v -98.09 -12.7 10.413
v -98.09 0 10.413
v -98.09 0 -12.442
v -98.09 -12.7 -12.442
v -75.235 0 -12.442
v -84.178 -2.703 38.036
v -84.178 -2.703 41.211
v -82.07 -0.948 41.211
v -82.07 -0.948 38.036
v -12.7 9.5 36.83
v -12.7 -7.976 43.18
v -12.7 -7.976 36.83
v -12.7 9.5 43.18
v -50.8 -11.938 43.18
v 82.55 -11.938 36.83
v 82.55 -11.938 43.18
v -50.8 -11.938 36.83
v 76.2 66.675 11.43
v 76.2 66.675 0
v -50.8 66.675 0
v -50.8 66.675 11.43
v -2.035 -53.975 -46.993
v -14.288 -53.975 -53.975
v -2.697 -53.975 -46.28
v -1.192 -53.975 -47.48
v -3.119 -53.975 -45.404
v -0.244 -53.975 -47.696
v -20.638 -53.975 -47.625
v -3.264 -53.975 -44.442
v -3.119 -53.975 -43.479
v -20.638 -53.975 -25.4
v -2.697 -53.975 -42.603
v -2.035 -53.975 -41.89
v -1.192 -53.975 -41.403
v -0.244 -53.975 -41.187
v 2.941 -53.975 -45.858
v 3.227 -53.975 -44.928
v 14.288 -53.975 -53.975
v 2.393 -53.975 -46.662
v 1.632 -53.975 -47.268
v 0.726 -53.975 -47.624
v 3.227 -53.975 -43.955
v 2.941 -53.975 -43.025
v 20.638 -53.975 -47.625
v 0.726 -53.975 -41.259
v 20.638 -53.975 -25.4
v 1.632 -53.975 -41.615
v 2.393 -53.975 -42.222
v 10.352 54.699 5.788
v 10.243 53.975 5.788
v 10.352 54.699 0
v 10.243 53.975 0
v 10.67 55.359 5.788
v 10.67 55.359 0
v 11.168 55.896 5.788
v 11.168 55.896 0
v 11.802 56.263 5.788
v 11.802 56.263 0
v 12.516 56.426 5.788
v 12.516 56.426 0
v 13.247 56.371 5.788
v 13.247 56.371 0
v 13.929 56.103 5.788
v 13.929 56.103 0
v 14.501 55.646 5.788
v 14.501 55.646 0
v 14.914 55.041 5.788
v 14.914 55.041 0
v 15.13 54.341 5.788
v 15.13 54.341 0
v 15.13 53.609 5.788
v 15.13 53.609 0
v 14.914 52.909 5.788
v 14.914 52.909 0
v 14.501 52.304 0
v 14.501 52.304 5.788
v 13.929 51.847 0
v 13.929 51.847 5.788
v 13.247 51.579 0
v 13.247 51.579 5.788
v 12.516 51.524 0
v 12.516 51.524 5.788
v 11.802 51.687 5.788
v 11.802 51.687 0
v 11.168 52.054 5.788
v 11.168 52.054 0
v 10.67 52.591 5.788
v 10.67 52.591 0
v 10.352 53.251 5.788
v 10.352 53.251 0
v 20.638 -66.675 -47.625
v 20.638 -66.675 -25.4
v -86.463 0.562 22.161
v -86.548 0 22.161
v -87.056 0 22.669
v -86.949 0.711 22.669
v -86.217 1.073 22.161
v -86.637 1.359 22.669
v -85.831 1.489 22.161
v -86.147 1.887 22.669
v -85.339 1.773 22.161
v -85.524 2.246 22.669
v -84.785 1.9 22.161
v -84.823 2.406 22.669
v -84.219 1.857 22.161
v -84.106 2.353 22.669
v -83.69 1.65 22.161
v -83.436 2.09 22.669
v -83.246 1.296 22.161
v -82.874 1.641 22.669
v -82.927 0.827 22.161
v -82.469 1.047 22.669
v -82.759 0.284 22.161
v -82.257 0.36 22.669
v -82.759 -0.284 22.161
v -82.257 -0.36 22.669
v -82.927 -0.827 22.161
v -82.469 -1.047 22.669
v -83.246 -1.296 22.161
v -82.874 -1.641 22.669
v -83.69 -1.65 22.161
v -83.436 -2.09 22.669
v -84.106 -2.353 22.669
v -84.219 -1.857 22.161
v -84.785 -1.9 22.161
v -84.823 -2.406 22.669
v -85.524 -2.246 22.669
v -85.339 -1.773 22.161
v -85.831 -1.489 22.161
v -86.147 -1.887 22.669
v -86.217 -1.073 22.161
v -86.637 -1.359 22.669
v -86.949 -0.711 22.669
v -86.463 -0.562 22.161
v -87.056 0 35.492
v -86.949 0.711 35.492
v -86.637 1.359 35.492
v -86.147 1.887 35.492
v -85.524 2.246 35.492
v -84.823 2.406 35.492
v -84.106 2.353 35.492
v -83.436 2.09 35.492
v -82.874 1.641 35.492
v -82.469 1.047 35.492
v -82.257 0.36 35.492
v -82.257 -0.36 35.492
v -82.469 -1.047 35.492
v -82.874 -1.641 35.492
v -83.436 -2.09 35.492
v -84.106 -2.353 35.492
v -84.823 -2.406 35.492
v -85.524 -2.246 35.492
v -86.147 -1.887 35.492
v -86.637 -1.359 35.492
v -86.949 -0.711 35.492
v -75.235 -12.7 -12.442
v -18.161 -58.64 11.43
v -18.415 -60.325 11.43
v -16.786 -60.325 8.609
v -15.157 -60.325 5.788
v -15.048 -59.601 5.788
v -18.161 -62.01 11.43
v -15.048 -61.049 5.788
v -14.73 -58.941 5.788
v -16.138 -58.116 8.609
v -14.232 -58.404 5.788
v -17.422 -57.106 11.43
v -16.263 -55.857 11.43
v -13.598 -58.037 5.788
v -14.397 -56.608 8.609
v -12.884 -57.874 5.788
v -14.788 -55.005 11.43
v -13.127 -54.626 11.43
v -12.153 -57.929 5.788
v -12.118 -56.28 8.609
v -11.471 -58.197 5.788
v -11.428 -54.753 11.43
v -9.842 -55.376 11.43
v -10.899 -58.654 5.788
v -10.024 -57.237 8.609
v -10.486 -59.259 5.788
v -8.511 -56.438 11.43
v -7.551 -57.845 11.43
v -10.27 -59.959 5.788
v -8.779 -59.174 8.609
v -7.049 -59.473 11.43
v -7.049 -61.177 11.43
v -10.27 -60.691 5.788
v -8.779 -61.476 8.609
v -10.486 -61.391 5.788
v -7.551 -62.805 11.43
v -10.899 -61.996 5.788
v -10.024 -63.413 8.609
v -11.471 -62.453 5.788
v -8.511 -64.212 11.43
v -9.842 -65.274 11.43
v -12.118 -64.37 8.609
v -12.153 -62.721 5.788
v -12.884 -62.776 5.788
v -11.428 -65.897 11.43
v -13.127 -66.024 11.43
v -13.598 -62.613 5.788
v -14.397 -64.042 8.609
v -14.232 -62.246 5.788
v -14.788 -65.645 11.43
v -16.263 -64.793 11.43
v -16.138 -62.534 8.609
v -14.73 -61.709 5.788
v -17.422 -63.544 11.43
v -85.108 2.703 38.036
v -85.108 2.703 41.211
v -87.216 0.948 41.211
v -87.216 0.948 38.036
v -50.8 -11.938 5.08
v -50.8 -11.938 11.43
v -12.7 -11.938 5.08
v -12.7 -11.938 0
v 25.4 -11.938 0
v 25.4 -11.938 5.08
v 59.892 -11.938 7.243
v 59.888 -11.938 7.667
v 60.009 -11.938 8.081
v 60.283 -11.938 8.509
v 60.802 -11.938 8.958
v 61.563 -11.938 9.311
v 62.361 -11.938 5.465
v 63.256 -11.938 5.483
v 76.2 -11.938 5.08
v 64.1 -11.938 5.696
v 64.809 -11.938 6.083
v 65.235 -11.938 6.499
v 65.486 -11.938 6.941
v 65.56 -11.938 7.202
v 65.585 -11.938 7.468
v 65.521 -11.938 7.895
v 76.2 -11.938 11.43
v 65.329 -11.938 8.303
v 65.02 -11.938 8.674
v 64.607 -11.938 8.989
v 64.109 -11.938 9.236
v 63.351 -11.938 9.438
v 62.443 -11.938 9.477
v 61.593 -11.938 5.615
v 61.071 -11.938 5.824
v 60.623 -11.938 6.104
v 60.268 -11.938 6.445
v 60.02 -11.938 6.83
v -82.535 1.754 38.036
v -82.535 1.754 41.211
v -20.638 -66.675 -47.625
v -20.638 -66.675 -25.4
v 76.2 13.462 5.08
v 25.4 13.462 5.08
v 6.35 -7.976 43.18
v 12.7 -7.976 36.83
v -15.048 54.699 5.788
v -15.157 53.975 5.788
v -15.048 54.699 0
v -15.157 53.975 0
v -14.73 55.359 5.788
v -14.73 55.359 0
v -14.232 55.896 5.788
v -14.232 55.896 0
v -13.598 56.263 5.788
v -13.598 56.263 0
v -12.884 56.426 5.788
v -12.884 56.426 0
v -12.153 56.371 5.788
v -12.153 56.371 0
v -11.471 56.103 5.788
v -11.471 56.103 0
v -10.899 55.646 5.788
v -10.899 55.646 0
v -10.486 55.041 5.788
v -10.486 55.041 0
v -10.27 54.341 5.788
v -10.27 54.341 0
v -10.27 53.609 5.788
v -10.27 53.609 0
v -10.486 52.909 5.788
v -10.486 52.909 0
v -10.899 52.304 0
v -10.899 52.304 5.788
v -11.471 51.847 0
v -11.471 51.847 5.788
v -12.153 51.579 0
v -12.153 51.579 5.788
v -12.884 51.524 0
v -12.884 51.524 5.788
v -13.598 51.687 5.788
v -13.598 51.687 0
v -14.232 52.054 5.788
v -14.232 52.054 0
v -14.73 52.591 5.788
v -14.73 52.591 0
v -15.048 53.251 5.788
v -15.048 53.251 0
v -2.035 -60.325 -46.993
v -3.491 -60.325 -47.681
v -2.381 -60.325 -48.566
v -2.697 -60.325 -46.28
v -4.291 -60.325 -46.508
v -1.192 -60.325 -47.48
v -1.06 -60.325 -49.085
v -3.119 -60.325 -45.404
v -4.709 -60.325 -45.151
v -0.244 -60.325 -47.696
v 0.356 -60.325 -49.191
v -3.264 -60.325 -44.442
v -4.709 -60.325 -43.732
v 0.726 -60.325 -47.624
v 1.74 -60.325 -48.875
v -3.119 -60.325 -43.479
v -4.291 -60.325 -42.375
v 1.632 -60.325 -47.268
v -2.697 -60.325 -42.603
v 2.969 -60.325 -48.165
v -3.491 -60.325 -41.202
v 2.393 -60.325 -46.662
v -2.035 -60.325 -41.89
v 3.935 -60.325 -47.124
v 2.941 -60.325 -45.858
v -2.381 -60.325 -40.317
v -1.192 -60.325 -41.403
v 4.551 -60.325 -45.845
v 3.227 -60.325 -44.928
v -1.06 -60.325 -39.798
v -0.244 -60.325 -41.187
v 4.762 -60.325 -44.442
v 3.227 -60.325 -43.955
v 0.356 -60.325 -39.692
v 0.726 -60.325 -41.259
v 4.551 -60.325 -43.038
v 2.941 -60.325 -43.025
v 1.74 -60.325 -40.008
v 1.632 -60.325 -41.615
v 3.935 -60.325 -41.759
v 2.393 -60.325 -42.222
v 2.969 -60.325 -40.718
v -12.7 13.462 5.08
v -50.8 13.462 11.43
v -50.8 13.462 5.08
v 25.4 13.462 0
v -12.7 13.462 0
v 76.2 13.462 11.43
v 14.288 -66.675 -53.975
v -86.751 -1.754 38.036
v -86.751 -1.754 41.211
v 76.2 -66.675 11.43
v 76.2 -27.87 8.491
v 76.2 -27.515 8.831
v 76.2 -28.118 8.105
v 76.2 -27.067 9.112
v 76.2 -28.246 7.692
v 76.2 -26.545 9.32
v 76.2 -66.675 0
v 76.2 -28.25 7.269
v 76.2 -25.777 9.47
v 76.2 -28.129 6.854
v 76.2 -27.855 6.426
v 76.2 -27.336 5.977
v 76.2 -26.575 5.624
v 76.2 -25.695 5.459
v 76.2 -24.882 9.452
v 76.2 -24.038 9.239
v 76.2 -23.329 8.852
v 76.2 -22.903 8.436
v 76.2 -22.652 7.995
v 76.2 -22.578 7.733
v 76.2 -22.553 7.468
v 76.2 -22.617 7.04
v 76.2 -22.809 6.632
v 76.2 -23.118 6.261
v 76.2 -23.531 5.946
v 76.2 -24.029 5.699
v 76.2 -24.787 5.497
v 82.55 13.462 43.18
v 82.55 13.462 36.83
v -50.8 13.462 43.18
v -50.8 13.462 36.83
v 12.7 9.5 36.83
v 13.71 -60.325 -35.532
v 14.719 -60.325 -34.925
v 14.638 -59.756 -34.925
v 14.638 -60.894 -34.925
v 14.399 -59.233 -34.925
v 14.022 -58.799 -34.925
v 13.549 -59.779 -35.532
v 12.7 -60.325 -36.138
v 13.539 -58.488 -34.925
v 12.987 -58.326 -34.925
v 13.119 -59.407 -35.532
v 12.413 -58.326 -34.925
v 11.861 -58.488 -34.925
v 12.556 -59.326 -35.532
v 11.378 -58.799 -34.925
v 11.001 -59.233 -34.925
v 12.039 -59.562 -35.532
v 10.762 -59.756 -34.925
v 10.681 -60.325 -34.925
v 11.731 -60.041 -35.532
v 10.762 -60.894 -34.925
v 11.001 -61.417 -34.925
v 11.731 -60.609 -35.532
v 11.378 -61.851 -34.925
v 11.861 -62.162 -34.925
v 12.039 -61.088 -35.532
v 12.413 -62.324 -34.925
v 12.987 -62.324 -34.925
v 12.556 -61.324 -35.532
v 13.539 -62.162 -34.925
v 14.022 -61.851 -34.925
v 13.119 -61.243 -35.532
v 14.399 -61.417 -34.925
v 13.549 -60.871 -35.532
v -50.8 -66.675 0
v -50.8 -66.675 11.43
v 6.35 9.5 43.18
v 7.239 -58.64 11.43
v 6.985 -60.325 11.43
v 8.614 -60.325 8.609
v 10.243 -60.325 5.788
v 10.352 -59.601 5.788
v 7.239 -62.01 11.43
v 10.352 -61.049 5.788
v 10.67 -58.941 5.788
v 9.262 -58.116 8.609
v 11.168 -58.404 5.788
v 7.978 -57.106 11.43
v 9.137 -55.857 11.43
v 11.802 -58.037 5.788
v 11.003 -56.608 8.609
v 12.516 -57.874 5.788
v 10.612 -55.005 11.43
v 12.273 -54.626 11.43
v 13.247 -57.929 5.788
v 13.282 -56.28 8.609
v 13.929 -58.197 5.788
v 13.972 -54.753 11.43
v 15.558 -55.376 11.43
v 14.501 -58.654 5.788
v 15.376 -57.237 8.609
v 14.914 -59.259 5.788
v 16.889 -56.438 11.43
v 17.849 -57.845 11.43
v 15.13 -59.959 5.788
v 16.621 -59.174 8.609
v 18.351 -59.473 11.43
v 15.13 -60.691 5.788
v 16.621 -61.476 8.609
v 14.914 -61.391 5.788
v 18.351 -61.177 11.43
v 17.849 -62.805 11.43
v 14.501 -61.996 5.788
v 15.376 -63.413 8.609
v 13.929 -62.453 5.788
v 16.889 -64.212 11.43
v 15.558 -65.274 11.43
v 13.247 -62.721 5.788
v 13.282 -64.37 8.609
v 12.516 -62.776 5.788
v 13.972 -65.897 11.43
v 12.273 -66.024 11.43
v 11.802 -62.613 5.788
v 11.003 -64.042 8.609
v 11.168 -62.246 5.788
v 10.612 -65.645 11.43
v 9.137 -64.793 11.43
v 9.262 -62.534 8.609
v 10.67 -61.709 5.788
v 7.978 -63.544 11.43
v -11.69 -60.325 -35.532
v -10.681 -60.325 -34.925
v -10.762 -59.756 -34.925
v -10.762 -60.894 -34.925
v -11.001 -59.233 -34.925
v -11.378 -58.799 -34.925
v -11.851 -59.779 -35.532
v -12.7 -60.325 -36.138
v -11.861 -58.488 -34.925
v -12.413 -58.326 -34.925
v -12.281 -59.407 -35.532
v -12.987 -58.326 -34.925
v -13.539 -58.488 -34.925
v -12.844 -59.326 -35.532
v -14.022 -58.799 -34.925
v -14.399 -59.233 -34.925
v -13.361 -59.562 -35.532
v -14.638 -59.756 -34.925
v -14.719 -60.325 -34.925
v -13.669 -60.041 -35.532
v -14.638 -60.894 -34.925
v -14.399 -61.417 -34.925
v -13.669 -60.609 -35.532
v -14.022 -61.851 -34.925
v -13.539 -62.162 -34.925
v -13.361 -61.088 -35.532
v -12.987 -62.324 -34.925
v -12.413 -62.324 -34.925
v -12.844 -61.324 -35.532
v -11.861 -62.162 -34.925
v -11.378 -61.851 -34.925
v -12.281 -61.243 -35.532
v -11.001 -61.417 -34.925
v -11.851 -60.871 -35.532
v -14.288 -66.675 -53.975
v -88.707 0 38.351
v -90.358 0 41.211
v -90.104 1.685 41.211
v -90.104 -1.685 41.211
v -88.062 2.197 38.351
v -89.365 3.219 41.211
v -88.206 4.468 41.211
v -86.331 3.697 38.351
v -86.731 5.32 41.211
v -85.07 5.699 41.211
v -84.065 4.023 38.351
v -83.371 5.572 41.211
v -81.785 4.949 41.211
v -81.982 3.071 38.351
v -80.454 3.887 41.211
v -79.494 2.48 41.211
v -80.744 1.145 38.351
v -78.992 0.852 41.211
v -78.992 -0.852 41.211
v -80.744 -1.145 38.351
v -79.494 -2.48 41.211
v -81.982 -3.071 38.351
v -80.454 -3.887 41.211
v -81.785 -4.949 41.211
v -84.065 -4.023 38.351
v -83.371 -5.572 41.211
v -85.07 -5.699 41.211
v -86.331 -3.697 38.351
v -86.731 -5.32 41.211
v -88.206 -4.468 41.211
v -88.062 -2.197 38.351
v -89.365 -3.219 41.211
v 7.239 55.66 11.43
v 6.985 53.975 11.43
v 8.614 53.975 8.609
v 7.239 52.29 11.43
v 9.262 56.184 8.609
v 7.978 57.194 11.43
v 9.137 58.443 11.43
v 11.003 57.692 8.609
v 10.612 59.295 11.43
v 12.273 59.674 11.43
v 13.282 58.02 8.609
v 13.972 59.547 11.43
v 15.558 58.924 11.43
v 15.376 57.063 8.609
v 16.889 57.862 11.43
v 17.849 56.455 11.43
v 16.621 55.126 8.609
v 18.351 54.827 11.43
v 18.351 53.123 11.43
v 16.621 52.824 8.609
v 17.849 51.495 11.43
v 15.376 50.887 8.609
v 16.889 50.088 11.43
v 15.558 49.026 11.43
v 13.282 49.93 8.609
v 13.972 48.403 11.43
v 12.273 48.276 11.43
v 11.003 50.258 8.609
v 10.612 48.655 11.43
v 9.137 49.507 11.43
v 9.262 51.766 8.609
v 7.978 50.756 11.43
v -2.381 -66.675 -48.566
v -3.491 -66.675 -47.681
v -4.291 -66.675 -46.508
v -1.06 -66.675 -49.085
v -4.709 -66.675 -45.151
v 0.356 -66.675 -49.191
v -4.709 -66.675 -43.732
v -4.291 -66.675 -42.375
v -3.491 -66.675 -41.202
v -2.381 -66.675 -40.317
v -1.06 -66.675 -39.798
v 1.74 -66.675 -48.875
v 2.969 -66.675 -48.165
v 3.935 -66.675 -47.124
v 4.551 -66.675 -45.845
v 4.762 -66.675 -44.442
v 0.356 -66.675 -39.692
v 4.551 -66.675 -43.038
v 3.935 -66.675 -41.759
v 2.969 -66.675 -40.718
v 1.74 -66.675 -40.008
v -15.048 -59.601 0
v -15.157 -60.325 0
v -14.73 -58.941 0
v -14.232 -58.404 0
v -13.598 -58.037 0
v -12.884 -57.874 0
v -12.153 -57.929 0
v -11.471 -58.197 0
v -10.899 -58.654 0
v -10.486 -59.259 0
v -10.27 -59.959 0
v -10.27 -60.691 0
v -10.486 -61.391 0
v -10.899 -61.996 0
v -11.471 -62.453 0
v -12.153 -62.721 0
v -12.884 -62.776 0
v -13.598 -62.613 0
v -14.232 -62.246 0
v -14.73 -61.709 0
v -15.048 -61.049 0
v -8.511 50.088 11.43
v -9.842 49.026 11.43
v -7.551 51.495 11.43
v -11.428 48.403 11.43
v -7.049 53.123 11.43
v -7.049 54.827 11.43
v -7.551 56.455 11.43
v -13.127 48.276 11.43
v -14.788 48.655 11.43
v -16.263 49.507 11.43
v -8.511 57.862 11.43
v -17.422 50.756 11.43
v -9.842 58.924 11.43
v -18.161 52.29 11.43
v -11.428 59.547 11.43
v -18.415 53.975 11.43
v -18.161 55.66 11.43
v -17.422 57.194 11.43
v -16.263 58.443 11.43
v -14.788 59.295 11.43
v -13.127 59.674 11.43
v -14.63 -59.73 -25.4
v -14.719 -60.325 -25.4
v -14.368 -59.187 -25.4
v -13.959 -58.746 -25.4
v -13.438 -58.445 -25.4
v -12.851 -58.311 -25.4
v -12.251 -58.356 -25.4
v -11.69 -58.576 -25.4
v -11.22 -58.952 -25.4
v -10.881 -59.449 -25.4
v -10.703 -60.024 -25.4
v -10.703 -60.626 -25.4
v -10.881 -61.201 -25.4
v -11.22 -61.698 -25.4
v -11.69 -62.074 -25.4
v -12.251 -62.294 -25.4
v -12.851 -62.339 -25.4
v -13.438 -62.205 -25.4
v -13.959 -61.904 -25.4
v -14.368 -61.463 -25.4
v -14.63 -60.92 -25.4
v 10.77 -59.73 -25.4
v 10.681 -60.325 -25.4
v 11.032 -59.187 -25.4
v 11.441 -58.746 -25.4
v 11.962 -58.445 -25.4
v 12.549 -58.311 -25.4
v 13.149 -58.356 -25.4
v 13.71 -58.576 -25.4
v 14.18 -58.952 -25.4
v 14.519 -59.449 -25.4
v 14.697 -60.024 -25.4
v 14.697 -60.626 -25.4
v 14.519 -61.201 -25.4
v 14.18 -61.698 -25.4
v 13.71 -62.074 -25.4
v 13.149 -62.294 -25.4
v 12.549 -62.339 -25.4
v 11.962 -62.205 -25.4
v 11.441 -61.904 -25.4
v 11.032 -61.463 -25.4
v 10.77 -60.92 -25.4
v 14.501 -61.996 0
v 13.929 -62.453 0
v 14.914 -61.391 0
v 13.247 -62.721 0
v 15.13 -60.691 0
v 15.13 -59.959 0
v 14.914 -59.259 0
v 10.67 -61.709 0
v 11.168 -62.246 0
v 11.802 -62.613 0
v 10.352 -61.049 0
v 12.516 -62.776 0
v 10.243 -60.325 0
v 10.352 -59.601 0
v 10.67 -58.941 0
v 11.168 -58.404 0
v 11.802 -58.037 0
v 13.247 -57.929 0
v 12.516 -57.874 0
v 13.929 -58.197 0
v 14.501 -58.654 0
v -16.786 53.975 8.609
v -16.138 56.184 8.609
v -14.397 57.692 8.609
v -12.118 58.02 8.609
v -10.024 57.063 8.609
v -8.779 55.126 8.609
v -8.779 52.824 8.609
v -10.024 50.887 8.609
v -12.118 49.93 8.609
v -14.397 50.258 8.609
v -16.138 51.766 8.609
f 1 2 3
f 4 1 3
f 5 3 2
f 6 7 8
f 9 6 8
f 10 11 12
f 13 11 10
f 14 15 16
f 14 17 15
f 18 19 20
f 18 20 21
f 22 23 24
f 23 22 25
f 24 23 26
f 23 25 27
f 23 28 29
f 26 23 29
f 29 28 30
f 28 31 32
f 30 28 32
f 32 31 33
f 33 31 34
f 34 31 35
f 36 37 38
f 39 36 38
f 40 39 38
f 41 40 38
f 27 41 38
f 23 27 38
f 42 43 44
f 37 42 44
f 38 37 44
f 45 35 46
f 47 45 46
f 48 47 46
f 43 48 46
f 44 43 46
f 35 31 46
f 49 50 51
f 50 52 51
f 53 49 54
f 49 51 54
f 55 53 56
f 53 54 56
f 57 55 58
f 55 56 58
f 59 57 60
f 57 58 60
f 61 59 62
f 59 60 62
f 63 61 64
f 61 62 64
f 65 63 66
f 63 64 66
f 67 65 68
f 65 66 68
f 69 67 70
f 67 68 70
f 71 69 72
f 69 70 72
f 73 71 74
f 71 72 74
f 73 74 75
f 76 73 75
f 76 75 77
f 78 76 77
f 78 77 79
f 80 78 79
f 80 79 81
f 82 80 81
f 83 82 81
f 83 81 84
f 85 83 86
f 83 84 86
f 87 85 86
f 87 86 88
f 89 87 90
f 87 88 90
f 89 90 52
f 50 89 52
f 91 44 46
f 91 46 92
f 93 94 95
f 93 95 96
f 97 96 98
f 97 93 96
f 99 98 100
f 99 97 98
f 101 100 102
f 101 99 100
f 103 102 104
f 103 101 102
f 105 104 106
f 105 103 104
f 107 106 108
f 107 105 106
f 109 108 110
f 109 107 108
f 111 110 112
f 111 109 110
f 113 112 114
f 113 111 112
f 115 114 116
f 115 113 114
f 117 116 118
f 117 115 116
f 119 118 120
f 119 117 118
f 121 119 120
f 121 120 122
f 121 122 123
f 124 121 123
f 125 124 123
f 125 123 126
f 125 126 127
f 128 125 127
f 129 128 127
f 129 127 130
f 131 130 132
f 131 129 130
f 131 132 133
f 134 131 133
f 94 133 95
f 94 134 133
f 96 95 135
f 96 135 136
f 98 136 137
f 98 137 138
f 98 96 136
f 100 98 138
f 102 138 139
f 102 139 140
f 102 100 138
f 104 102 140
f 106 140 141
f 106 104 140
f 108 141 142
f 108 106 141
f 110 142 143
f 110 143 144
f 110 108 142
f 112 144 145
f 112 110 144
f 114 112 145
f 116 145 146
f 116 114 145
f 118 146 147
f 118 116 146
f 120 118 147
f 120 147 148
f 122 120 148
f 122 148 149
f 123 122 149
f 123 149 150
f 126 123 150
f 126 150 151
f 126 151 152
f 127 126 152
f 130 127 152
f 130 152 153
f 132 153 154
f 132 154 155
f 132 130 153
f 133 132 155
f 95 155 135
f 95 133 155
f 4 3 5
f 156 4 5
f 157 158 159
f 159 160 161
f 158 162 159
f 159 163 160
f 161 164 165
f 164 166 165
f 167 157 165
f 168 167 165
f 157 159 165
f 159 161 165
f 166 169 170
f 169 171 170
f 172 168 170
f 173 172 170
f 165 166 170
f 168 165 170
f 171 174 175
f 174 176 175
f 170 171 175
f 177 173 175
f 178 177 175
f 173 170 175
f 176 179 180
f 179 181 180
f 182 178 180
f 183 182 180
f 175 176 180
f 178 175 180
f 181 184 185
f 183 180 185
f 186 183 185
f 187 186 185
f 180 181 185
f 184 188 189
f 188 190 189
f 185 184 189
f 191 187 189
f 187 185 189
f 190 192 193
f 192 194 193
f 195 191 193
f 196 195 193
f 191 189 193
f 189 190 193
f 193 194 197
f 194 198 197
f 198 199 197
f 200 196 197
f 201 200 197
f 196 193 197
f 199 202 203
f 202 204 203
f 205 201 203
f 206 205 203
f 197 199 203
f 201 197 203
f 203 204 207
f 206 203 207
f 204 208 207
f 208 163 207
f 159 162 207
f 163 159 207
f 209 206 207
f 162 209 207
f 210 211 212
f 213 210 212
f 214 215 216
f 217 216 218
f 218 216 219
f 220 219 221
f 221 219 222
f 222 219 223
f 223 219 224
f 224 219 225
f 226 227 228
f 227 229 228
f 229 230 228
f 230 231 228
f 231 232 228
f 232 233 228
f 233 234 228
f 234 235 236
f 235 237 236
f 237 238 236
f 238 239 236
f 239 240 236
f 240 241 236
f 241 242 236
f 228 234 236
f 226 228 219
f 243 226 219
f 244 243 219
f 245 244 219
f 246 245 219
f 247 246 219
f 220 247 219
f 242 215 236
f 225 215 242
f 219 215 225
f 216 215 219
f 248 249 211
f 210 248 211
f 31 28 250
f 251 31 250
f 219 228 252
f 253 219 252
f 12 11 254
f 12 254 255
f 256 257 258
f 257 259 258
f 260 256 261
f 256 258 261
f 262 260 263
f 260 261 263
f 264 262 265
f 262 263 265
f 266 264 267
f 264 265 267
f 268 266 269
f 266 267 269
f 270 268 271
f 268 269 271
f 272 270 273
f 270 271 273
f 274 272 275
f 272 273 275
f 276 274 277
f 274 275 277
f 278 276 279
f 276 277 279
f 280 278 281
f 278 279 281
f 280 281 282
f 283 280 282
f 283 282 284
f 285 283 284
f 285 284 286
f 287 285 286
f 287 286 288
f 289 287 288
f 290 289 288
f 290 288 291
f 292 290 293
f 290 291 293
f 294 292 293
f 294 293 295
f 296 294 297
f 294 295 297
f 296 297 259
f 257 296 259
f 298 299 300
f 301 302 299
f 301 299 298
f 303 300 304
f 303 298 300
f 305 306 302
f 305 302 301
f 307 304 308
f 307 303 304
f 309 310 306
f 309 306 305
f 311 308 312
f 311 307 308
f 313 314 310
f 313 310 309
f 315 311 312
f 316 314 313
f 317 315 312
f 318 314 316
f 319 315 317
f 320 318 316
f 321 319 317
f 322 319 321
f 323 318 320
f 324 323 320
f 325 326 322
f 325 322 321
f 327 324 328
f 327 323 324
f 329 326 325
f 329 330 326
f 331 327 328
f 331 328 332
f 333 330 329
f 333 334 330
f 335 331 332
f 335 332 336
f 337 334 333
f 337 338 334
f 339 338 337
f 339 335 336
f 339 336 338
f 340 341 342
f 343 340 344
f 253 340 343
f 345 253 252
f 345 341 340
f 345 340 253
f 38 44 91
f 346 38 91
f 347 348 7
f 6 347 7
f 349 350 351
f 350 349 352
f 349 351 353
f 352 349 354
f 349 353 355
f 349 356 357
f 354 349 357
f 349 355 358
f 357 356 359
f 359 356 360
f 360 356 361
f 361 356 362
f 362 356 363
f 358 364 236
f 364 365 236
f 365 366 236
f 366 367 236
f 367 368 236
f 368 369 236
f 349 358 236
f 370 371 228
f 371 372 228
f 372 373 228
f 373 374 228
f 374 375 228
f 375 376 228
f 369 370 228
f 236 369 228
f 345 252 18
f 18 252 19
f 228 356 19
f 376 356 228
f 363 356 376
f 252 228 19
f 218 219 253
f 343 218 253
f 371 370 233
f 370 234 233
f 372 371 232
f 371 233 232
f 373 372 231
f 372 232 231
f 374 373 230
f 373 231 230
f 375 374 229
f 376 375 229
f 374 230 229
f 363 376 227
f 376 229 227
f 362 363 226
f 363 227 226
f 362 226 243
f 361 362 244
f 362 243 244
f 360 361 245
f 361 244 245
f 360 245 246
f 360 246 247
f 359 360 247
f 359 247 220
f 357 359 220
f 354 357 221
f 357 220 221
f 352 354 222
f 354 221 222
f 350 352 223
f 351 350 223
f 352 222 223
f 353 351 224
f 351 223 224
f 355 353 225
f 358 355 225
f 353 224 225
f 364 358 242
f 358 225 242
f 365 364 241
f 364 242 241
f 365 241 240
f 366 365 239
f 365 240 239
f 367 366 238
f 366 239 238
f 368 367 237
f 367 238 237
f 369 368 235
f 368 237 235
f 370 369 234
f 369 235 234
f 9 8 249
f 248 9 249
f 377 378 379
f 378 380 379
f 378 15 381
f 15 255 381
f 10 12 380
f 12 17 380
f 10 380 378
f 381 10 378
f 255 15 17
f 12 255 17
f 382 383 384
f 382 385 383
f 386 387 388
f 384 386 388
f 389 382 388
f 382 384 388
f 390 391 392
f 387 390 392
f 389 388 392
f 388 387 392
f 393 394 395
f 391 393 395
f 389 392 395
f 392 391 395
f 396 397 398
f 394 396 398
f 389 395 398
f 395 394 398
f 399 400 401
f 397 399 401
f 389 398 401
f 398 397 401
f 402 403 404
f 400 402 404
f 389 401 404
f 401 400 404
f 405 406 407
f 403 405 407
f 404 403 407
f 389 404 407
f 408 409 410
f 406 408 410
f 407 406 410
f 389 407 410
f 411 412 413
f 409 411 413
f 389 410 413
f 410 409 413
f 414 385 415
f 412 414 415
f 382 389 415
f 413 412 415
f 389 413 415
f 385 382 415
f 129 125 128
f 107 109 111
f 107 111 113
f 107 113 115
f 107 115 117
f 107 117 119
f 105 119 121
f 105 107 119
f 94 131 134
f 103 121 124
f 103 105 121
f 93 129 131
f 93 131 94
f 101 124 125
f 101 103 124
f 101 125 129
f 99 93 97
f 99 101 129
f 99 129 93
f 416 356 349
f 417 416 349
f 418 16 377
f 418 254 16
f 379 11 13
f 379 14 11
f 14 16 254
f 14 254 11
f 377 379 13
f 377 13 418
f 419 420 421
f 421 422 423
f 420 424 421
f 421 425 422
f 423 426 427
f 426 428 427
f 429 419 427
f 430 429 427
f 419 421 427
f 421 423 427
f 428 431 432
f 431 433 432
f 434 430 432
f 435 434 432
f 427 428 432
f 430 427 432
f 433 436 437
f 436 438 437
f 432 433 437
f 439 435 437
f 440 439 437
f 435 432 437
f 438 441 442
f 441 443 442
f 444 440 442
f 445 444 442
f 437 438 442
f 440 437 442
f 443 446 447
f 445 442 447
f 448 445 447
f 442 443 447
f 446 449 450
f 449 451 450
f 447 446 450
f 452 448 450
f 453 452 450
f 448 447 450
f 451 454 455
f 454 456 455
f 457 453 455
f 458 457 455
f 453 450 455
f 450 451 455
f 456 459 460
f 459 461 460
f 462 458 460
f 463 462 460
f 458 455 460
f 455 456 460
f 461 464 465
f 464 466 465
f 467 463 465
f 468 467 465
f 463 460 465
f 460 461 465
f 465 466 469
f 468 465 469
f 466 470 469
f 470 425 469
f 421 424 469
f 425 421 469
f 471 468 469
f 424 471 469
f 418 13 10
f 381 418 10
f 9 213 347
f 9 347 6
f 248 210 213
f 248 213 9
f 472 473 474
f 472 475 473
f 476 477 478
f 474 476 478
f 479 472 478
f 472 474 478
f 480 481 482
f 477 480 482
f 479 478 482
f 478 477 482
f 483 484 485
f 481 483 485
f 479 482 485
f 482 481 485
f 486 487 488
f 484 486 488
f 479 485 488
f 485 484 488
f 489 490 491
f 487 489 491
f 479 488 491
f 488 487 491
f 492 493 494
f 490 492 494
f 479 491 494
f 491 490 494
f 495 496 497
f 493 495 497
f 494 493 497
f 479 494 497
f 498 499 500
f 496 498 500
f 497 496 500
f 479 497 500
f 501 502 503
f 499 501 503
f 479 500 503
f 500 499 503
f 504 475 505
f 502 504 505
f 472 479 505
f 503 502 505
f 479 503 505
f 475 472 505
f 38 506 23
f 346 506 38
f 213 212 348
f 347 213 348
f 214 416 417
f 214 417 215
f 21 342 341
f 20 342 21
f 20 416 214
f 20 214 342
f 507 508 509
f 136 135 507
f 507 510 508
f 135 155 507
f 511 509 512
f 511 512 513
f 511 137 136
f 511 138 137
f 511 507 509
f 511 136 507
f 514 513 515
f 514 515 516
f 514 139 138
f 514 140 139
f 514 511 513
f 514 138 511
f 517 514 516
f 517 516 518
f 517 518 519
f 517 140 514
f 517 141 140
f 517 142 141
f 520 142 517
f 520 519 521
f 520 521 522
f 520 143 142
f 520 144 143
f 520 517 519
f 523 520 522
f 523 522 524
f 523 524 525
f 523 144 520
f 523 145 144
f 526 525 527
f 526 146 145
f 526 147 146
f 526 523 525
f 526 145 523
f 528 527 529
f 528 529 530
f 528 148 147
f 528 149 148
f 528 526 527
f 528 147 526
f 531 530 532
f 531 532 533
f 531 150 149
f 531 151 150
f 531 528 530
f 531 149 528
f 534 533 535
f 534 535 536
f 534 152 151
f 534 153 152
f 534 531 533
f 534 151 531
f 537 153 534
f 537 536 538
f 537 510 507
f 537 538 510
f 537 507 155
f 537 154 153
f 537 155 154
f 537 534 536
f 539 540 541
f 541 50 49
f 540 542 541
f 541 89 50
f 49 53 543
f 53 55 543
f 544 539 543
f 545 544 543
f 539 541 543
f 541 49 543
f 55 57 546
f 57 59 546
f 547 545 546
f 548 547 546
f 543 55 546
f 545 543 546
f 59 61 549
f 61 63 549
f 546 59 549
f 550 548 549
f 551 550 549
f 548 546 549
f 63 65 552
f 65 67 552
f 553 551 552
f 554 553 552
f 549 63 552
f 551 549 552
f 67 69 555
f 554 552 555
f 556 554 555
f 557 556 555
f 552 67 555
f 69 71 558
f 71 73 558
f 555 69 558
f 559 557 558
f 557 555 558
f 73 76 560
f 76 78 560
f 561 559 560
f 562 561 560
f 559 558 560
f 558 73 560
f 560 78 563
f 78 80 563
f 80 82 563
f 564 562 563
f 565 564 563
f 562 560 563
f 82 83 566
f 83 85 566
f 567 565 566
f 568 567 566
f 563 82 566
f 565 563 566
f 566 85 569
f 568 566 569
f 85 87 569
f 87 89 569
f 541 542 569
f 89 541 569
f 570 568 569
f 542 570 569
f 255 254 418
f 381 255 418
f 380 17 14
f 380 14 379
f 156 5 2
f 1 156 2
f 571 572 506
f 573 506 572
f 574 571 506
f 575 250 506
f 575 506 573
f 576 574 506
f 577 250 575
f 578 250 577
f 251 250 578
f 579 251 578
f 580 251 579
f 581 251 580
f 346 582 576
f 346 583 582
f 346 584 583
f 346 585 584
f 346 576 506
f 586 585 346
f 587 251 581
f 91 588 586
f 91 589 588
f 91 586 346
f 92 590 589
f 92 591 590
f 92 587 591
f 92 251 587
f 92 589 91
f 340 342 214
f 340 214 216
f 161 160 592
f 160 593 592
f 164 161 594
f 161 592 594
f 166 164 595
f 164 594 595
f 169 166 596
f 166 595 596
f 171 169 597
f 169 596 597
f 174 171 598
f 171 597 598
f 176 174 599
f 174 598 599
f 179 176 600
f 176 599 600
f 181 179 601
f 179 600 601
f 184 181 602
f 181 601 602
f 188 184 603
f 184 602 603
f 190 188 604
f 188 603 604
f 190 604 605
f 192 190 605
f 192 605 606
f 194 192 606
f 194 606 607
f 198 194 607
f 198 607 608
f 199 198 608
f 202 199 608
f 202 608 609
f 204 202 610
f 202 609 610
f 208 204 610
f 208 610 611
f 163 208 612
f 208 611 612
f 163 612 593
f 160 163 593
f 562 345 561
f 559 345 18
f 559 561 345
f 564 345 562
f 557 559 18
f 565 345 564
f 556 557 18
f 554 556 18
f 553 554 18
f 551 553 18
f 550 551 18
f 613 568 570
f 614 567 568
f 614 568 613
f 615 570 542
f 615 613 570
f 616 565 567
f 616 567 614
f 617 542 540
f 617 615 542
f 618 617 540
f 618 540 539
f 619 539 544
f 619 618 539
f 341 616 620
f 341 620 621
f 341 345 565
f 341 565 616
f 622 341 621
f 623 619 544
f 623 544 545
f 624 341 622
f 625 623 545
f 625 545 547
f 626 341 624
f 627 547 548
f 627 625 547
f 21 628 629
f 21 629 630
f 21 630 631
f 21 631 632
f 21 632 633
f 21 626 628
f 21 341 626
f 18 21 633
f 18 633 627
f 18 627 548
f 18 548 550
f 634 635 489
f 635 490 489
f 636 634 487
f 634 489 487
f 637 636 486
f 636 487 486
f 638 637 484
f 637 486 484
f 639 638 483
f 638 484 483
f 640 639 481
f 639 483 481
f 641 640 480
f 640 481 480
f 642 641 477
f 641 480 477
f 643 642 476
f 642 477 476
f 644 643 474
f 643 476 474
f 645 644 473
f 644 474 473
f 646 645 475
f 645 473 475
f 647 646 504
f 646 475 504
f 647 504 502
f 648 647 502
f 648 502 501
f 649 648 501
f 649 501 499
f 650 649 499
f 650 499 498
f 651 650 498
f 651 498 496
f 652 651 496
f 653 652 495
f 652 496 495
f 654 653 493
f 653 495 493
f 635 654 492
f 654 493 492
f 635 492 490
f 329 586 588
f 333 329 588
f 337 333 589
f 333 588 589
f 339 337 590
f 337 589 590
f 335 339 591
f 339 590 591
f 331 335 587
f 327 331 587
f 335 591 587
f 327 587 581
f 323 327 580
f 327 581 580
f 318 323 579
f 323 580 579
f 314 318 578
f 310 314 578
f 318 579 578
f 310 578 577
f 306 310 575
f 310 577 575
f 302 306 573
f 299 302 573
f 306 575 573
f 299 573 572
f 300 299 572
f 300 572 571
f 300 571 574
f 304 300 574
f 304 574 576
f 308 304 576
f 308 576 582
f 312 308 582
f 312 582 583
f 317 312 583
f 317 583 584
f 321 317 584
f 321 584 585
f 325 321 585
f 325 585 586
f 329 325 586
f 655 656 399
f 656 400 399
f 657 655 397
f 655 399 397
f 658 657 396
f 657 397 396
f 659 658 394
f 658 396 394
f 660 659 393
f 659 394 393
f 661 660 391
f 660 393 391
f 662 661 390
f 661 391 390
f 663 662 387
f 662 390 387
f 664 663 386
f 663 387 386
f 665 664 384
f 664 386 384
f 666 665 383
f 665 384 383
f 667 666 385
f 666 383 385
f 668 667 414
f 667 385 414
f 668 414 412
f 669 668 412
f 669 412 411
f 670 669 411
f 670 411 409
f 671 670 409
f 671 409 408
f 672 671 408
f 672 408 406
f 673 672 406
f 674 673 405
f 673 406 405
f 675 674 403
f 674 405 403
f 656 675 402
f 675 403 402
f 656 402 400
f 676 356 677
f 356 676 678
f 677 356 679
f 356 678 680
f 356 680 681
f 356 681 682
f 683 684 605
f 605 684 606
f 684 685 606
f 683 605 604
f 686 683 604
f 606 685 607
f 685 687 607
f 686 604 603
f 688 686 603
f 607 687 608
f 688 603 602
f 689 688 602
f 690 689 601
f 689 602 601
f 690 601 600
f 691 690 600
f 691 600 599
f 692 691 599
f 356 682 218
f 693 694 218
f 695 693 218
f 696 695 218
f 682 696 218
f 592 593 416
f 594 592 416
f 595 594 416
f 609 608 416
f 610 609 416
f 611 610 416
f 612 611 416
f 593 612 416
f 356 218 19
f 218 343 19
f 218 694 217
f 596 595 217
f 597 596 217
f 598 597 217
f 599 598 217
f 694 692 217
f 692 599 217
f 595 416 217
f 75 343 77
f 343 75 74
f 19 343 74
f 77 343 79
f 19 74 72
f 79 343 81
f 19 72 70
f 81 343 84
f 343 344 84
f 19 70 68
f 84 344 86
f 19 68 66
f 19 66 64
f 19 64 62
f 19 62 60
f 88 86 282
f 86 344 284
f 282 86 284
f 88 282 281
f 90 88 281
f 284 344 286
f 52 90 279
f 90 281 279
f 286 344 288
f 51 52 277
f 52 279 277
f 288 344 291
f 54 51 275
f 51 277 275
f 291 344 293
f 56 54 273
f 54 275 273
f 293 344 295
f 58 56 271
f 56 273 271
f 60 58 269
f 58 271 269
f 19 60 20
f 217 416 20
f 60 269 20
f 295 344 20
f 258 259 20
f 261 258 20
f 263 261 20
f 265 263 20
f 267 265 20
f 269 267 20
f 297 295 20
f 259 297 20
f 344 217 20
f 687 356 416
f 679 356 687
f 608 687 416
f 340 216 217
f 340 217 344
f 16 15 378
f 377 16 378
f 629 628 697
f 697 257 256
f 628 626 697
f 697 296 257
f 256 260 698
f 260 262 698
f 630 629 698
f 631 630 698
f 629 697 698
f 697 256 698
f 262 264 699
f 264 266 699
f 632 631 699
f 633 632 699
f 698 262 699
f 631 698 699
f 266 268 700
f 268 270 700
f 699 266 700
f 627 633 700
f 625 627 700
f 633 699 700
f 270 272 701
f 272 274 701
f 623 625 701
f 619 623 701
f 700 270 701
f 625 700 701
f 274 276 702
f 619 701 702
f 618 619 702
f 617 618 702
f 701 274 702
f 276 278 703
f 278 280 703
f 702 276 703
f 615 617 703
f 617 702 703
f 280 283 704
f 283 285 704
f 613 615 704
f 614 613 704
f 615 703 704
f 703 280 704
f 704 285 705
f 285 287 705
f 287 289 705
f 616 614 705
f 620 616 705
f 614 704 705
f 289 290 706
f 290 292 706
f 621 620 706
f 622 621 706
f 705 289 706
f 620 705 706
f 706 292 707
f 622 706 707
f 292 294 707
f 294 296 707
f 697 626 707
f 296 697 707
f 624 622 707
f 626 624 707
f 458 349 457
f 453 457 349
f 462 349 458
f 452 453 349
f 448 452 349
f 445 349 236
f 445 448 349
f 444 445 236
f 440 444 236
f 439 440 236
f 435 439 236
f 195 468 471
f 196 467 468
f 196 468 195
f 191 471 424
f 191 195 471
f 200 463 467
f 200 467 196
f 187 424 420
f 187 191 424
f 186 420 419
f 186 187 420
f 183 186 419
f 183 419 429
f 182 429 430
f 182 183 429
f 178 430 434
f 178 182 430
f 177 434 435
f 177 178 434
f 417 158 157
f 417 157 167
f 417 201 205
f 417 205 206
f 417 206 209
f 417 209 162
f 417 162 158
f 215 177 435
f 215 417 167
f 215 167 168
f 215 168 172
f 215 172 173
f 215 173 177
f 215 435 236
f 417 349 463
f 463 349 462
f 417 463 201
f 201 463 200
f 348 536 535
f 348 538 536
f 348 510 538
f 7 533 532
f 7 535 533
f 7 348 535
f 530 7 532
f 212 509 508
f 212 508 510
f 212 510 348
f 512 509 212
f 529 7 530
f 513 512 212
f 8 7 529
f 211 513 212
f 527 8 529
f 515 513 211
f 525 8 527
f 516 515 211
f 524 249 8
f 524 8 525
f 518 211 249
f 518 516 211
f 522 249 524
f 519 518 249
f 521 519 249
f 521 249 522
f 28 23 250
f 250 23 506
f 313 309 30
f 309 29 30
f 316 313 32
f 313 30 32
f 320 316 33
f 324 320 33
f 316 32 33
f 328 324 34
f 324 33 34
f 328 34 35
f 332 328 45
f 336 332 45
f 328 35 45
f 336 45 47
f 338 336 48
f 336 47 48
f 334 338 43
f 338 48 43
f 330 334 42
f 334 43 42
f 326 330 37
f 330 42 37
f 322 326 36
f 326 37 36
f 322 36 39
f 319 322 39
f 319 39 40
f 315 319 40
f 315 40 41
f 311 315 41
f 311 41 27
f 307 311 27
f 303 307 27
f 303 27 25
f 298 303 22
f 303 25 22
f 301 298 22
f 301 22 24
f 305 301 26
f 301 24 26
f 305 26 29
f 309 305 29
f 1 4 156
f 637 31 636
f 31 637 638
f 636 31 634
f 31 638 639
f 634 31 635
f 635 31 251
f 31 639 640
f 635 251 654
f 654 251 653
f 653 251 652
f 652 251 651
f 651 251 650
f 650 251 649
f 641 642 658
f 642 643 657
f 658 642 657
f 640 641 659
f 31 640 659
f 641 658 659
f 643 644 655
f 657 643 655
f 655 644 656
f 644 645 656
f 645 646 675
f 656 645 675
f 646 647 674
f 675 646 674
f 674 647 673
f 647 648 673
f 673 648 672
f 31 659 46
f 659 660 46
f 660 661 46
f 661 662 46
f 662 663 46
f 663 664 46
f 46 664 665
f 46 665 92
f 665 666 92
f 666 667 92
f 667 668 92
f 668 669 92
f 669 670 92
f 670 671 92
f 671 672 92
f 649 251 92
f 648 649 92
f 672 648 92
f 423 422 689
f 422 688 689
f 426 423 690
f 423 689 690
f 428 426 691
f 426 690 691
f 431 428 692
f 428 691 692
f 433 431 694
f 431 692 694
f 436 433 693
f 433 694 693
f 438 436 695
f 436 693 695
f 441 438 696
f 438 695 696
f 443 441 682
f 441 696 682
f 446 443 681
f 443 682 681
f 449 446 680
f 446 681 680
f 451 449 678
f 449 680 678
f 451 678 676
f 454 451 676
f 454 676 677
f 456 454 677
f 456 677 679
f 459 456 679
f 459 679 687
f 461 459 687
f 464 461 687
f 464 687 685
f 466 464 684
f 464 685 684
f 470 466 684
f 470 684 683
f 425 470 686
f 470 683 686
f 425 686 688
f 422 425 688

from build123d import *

# Parameters (mm, degrees)
F0_W            = 101.6
F0_H            = 133.35
F1_DEPTH        = 11.43
F3_D            = 4.9149
F3_CSINK_D      = 11.43
F3_CSINK_ANGLE  = 60
F5_W            = 41.275
F5_H            = 12.7
F6_DEPTH        = 28.575
F8_D            = 4.0386
F8_DEPTH        = 9.525
F8_TIP          = 1.213317848
F10_D           = 6.5278
F10_CBORE_D     = 9.525
F10_CBORE_DEPTH = 6.35
F11_W           = 38.1
F11_H           = 25.4
F11_W_2         = 25.4
F12_DEPTH       = 6.35
F13_DEPTH       = 65.406
F15_W           = 101.6
F15_H           = 25.4
F16_DEPTH       = 6.35
F17_W           = 19.05
F17_H           = 17.4752
F18_DEPTH       = 97.156
F20_DEPTH       = 12.7
F21_SIZE2       = 6.34999
F21_SIZE        = 6.34999
F22_DEPTH       = 12.7
F23_DEPTH       = 25.4
F24_DEPTH       = 19.05
F25_SIZE        = 6.35
F28_D           = 4.0386
F28_DEPTH       = 25.4
F28_START       = 31.1992039
F28_TIP         = 1.213317848
F31_SIZE        = 0.508
F33_DEPTH       = 3.175


# Not quite as in the source:
# - a fillet or chamfer is up to 0.001 mm smaller than in the source, because OpenCascade refuses the exact size


with BuildPart() as f1:
    # F0 (on Top) → F1 (new body)
    with BuildSketch(Plane.XY):
        Rectangle(F0_W, F0_H)
    extrude(amount=F1_DEPTH)

    # F3 (through all)
    with Locations(Plane.XY.offset(11.43)):
        with Locations((-12.7, 53.975), (12.7, 53.975), (-12.7, -60.325), (12.7, -60.325)):
            CounterSinkHole(F3_D / 2, F3_CSINK_D / 2, counter_sink_angle=F3_CSINK_ANGLE)

    # F11 (on face) → F12 (cut)
    with BuildSketch(Plane.XY.offset(11.43)):
        with Locations((-31.75, 0.762)):
            Rectangle(F11_W, F11_H)
        with Locations((38.1, 0.762)):
            Rectangle(F11_W_2, F11_H)
    extrude(amount=-F12_DEPTH, mode=Mode.SUBTRACT)

    # F11 (on face) → F13 (cut, through all)
    with BuildSketch(Plane.XY.offset(11.43)):
        with Locations((6.35, 0.762)):
            Rectangle(F11_W, F11_H)
    extrude(amount=-F13_DEPTH, mode=Mode.SUBTRACT)

    # F23 (add): a face of the model
    f23_faces = [f1.faces().sort_by_distance(p)[0] for p in [
        (50.8, 0, 1.338389607),
    ]]
    extrude(f23_faces, amount=F23_DEPTH)

    # F28
    # its depths count from where the whole tool has entered the part; down to there all is cleared
    with Locations(Plane(origin=(71.4375, -71.4375, 0), x_dir=(-0.7071067812, -0.7071067812, 0), z_dir=(0.7071067812, -0.7071067812, 0))):
        with Locations((-35.9150959726, -7.4676)):
            Hole(F28_D / 2, depth=F28_START)
    with Locations(Plane(origin=(71.4375, -71.4375, 0), x_dir=(-0.7071067812, -0.7071067812, 0), z_dir=(0.7071067812, -0.7071067812, 0)).offset(-F28_START)):
        with Locations((-35.9150959726, -7.4676)):
            Hole(F28_D / 2, depth=F28_DEPTH)
            with Locations((0, 0, -(F28_DEPTH + F28_TIP / 2))):  # 118° drill point
                Cone(0, F28_D / 2, F28_TIP, mode=Mode.SUBTRACT)


with BuildPart() as f6:
    # F5 (on offset) → F6 (new body)
    with BuildSketch(Plane(origin=(0, 0, -25.4), x_dir=(1, 0, 0), z_dir=(0, 0, -1))):
        with Locations((0, 60.325)):
            Rectangle(F5_W, F5_H)
    extrude(amount=F6_DEPTH)

    # F8
    with Locations(Plane.XY.offset(-25.4)):
        with Locations((-12.7, -60.325), (12.7, -60.325)):
            Hole(F8_D / 2, depth=F8_DEPTH)
            with Locations((0, 0, -(F8_DEPTH + F8_TIP / 2))):  # 118° drill point
                Cone(0, F8_D / 2, F8_TIP, mode=Mode.SUBTRACT)

    # F10 (through all)
    with Locations(Plane.XZ.offset(66.675)):
        with Locations((0, -44.4415174425)):
            CounterBoreHole(F10_D / 2, F10_CBORE_D / 2, F10_CBORE_DEPTH)

    # F25
    f25_edges = [f6.edges().sort_by_distance(p)[0] for p in [
        (-20.6375, -60.325, -53.975),
        (20.6375, -60.325, -53.975),
    ]]
    chamfer(f25_edges, length=F25_SIZE)


with BuildPart() as f16:
    # F15 (on offset) → F16 (new body)
    with BuildSketch(Plane.XY.offset(36.83)):
        with Locations((0, 0.762)):
            Rectangle(F15_W, F15_H)
    extrude(amount=F16_DEPTH)

    # F17 (on face) → F18 (cut, through all)
    with BuildSketch(Plane.XY.offset(43.18)):
        with Locations((-3.175, 0.762)):
            Rectangle(F17_W, F17_H)
    extrude(amount=-F18_DEPTH, mode=Mode.SUBTRACT)

    # F21 (size 6.35 and 6.35 in the source; OpenCascade refuses exactly that, so slightly less here)
    f21_edges = [f16.edges().sort_by_distance(p)[0] for p in [
        (6.35, 0.762, 36.83),
    ]]
    chamfer(f21_edges, length=F21_SIZE, length2=F21_SIZE2)

    # F22 (add): a face of the model
    f22_faces = [f16.faces().sort_by_distance(p)[0] for p in [
        (50.8, 0.762, 40.005),
    ]]
    extrude(f22_faces, amount=F22_DEPTH)

    # F24 (add): a face of the model
    f24_faces = [f16.faces().sort_by_distance(p)[0] for p in [
        (63.5, 0.762, 40.005),
    ]]
    extrude(f24_faces, amount=F24_DEPTH)


with BuildPart() as f20:
    # F19 (on Front) → F20 (new body)
    with BuildSketch(Plane.XZ):
        Polygon((-75.2351675029, -12.4421706577), (-98.090454936, 10.4131167755), (-98.090454936, -12.4421706577), align=None)
    extrude(amount=F20_DEPTH)


with BuildPart() as f30:
    # F29 (on Front) → F30 (revolve)
    with BuildSketch(Plane.XZ):
        Polygon((-84.6429214931, 41.2107444957), (-90.3579214931, 41.2107444957), (-87.0559214931, 35.4915127291), (-87.0559214931, 22.1607444957), (-84.6429214931, 22.1607444957), align=None)
    revolve(axis=Axis((-84.6429214931, 0, 31.6857444957), (0, 0, -1)))

    # F31
    f31_edges = [f30.edges().sort_by_distance(p)[0] for p in [
        (-82.229921, 0, 22.160744),
    ]]
    chamfer(f31_edges, length=F31_SIZE)

    # F32 (on face) → F33 (cut)
    with BuildSketch(Plane.XY.offset(41.2107444957)):
        Polygon((-84.1775248652, -2.7025184536), (-82.0697735441, -0.9482139242), (-82.535170172, 1.7543045294), (-85.1083181209, 2.7025184536), (-87.216069442, 0.9482139242), (-86.7506728141, -1.7543045294), align=None)
    extrude(amount=-F33_DEPTH, mode=Mode.SUBTRACT)


solid = Compound([f1.part, f6.part, f16.part, f20.part, f30.part])
